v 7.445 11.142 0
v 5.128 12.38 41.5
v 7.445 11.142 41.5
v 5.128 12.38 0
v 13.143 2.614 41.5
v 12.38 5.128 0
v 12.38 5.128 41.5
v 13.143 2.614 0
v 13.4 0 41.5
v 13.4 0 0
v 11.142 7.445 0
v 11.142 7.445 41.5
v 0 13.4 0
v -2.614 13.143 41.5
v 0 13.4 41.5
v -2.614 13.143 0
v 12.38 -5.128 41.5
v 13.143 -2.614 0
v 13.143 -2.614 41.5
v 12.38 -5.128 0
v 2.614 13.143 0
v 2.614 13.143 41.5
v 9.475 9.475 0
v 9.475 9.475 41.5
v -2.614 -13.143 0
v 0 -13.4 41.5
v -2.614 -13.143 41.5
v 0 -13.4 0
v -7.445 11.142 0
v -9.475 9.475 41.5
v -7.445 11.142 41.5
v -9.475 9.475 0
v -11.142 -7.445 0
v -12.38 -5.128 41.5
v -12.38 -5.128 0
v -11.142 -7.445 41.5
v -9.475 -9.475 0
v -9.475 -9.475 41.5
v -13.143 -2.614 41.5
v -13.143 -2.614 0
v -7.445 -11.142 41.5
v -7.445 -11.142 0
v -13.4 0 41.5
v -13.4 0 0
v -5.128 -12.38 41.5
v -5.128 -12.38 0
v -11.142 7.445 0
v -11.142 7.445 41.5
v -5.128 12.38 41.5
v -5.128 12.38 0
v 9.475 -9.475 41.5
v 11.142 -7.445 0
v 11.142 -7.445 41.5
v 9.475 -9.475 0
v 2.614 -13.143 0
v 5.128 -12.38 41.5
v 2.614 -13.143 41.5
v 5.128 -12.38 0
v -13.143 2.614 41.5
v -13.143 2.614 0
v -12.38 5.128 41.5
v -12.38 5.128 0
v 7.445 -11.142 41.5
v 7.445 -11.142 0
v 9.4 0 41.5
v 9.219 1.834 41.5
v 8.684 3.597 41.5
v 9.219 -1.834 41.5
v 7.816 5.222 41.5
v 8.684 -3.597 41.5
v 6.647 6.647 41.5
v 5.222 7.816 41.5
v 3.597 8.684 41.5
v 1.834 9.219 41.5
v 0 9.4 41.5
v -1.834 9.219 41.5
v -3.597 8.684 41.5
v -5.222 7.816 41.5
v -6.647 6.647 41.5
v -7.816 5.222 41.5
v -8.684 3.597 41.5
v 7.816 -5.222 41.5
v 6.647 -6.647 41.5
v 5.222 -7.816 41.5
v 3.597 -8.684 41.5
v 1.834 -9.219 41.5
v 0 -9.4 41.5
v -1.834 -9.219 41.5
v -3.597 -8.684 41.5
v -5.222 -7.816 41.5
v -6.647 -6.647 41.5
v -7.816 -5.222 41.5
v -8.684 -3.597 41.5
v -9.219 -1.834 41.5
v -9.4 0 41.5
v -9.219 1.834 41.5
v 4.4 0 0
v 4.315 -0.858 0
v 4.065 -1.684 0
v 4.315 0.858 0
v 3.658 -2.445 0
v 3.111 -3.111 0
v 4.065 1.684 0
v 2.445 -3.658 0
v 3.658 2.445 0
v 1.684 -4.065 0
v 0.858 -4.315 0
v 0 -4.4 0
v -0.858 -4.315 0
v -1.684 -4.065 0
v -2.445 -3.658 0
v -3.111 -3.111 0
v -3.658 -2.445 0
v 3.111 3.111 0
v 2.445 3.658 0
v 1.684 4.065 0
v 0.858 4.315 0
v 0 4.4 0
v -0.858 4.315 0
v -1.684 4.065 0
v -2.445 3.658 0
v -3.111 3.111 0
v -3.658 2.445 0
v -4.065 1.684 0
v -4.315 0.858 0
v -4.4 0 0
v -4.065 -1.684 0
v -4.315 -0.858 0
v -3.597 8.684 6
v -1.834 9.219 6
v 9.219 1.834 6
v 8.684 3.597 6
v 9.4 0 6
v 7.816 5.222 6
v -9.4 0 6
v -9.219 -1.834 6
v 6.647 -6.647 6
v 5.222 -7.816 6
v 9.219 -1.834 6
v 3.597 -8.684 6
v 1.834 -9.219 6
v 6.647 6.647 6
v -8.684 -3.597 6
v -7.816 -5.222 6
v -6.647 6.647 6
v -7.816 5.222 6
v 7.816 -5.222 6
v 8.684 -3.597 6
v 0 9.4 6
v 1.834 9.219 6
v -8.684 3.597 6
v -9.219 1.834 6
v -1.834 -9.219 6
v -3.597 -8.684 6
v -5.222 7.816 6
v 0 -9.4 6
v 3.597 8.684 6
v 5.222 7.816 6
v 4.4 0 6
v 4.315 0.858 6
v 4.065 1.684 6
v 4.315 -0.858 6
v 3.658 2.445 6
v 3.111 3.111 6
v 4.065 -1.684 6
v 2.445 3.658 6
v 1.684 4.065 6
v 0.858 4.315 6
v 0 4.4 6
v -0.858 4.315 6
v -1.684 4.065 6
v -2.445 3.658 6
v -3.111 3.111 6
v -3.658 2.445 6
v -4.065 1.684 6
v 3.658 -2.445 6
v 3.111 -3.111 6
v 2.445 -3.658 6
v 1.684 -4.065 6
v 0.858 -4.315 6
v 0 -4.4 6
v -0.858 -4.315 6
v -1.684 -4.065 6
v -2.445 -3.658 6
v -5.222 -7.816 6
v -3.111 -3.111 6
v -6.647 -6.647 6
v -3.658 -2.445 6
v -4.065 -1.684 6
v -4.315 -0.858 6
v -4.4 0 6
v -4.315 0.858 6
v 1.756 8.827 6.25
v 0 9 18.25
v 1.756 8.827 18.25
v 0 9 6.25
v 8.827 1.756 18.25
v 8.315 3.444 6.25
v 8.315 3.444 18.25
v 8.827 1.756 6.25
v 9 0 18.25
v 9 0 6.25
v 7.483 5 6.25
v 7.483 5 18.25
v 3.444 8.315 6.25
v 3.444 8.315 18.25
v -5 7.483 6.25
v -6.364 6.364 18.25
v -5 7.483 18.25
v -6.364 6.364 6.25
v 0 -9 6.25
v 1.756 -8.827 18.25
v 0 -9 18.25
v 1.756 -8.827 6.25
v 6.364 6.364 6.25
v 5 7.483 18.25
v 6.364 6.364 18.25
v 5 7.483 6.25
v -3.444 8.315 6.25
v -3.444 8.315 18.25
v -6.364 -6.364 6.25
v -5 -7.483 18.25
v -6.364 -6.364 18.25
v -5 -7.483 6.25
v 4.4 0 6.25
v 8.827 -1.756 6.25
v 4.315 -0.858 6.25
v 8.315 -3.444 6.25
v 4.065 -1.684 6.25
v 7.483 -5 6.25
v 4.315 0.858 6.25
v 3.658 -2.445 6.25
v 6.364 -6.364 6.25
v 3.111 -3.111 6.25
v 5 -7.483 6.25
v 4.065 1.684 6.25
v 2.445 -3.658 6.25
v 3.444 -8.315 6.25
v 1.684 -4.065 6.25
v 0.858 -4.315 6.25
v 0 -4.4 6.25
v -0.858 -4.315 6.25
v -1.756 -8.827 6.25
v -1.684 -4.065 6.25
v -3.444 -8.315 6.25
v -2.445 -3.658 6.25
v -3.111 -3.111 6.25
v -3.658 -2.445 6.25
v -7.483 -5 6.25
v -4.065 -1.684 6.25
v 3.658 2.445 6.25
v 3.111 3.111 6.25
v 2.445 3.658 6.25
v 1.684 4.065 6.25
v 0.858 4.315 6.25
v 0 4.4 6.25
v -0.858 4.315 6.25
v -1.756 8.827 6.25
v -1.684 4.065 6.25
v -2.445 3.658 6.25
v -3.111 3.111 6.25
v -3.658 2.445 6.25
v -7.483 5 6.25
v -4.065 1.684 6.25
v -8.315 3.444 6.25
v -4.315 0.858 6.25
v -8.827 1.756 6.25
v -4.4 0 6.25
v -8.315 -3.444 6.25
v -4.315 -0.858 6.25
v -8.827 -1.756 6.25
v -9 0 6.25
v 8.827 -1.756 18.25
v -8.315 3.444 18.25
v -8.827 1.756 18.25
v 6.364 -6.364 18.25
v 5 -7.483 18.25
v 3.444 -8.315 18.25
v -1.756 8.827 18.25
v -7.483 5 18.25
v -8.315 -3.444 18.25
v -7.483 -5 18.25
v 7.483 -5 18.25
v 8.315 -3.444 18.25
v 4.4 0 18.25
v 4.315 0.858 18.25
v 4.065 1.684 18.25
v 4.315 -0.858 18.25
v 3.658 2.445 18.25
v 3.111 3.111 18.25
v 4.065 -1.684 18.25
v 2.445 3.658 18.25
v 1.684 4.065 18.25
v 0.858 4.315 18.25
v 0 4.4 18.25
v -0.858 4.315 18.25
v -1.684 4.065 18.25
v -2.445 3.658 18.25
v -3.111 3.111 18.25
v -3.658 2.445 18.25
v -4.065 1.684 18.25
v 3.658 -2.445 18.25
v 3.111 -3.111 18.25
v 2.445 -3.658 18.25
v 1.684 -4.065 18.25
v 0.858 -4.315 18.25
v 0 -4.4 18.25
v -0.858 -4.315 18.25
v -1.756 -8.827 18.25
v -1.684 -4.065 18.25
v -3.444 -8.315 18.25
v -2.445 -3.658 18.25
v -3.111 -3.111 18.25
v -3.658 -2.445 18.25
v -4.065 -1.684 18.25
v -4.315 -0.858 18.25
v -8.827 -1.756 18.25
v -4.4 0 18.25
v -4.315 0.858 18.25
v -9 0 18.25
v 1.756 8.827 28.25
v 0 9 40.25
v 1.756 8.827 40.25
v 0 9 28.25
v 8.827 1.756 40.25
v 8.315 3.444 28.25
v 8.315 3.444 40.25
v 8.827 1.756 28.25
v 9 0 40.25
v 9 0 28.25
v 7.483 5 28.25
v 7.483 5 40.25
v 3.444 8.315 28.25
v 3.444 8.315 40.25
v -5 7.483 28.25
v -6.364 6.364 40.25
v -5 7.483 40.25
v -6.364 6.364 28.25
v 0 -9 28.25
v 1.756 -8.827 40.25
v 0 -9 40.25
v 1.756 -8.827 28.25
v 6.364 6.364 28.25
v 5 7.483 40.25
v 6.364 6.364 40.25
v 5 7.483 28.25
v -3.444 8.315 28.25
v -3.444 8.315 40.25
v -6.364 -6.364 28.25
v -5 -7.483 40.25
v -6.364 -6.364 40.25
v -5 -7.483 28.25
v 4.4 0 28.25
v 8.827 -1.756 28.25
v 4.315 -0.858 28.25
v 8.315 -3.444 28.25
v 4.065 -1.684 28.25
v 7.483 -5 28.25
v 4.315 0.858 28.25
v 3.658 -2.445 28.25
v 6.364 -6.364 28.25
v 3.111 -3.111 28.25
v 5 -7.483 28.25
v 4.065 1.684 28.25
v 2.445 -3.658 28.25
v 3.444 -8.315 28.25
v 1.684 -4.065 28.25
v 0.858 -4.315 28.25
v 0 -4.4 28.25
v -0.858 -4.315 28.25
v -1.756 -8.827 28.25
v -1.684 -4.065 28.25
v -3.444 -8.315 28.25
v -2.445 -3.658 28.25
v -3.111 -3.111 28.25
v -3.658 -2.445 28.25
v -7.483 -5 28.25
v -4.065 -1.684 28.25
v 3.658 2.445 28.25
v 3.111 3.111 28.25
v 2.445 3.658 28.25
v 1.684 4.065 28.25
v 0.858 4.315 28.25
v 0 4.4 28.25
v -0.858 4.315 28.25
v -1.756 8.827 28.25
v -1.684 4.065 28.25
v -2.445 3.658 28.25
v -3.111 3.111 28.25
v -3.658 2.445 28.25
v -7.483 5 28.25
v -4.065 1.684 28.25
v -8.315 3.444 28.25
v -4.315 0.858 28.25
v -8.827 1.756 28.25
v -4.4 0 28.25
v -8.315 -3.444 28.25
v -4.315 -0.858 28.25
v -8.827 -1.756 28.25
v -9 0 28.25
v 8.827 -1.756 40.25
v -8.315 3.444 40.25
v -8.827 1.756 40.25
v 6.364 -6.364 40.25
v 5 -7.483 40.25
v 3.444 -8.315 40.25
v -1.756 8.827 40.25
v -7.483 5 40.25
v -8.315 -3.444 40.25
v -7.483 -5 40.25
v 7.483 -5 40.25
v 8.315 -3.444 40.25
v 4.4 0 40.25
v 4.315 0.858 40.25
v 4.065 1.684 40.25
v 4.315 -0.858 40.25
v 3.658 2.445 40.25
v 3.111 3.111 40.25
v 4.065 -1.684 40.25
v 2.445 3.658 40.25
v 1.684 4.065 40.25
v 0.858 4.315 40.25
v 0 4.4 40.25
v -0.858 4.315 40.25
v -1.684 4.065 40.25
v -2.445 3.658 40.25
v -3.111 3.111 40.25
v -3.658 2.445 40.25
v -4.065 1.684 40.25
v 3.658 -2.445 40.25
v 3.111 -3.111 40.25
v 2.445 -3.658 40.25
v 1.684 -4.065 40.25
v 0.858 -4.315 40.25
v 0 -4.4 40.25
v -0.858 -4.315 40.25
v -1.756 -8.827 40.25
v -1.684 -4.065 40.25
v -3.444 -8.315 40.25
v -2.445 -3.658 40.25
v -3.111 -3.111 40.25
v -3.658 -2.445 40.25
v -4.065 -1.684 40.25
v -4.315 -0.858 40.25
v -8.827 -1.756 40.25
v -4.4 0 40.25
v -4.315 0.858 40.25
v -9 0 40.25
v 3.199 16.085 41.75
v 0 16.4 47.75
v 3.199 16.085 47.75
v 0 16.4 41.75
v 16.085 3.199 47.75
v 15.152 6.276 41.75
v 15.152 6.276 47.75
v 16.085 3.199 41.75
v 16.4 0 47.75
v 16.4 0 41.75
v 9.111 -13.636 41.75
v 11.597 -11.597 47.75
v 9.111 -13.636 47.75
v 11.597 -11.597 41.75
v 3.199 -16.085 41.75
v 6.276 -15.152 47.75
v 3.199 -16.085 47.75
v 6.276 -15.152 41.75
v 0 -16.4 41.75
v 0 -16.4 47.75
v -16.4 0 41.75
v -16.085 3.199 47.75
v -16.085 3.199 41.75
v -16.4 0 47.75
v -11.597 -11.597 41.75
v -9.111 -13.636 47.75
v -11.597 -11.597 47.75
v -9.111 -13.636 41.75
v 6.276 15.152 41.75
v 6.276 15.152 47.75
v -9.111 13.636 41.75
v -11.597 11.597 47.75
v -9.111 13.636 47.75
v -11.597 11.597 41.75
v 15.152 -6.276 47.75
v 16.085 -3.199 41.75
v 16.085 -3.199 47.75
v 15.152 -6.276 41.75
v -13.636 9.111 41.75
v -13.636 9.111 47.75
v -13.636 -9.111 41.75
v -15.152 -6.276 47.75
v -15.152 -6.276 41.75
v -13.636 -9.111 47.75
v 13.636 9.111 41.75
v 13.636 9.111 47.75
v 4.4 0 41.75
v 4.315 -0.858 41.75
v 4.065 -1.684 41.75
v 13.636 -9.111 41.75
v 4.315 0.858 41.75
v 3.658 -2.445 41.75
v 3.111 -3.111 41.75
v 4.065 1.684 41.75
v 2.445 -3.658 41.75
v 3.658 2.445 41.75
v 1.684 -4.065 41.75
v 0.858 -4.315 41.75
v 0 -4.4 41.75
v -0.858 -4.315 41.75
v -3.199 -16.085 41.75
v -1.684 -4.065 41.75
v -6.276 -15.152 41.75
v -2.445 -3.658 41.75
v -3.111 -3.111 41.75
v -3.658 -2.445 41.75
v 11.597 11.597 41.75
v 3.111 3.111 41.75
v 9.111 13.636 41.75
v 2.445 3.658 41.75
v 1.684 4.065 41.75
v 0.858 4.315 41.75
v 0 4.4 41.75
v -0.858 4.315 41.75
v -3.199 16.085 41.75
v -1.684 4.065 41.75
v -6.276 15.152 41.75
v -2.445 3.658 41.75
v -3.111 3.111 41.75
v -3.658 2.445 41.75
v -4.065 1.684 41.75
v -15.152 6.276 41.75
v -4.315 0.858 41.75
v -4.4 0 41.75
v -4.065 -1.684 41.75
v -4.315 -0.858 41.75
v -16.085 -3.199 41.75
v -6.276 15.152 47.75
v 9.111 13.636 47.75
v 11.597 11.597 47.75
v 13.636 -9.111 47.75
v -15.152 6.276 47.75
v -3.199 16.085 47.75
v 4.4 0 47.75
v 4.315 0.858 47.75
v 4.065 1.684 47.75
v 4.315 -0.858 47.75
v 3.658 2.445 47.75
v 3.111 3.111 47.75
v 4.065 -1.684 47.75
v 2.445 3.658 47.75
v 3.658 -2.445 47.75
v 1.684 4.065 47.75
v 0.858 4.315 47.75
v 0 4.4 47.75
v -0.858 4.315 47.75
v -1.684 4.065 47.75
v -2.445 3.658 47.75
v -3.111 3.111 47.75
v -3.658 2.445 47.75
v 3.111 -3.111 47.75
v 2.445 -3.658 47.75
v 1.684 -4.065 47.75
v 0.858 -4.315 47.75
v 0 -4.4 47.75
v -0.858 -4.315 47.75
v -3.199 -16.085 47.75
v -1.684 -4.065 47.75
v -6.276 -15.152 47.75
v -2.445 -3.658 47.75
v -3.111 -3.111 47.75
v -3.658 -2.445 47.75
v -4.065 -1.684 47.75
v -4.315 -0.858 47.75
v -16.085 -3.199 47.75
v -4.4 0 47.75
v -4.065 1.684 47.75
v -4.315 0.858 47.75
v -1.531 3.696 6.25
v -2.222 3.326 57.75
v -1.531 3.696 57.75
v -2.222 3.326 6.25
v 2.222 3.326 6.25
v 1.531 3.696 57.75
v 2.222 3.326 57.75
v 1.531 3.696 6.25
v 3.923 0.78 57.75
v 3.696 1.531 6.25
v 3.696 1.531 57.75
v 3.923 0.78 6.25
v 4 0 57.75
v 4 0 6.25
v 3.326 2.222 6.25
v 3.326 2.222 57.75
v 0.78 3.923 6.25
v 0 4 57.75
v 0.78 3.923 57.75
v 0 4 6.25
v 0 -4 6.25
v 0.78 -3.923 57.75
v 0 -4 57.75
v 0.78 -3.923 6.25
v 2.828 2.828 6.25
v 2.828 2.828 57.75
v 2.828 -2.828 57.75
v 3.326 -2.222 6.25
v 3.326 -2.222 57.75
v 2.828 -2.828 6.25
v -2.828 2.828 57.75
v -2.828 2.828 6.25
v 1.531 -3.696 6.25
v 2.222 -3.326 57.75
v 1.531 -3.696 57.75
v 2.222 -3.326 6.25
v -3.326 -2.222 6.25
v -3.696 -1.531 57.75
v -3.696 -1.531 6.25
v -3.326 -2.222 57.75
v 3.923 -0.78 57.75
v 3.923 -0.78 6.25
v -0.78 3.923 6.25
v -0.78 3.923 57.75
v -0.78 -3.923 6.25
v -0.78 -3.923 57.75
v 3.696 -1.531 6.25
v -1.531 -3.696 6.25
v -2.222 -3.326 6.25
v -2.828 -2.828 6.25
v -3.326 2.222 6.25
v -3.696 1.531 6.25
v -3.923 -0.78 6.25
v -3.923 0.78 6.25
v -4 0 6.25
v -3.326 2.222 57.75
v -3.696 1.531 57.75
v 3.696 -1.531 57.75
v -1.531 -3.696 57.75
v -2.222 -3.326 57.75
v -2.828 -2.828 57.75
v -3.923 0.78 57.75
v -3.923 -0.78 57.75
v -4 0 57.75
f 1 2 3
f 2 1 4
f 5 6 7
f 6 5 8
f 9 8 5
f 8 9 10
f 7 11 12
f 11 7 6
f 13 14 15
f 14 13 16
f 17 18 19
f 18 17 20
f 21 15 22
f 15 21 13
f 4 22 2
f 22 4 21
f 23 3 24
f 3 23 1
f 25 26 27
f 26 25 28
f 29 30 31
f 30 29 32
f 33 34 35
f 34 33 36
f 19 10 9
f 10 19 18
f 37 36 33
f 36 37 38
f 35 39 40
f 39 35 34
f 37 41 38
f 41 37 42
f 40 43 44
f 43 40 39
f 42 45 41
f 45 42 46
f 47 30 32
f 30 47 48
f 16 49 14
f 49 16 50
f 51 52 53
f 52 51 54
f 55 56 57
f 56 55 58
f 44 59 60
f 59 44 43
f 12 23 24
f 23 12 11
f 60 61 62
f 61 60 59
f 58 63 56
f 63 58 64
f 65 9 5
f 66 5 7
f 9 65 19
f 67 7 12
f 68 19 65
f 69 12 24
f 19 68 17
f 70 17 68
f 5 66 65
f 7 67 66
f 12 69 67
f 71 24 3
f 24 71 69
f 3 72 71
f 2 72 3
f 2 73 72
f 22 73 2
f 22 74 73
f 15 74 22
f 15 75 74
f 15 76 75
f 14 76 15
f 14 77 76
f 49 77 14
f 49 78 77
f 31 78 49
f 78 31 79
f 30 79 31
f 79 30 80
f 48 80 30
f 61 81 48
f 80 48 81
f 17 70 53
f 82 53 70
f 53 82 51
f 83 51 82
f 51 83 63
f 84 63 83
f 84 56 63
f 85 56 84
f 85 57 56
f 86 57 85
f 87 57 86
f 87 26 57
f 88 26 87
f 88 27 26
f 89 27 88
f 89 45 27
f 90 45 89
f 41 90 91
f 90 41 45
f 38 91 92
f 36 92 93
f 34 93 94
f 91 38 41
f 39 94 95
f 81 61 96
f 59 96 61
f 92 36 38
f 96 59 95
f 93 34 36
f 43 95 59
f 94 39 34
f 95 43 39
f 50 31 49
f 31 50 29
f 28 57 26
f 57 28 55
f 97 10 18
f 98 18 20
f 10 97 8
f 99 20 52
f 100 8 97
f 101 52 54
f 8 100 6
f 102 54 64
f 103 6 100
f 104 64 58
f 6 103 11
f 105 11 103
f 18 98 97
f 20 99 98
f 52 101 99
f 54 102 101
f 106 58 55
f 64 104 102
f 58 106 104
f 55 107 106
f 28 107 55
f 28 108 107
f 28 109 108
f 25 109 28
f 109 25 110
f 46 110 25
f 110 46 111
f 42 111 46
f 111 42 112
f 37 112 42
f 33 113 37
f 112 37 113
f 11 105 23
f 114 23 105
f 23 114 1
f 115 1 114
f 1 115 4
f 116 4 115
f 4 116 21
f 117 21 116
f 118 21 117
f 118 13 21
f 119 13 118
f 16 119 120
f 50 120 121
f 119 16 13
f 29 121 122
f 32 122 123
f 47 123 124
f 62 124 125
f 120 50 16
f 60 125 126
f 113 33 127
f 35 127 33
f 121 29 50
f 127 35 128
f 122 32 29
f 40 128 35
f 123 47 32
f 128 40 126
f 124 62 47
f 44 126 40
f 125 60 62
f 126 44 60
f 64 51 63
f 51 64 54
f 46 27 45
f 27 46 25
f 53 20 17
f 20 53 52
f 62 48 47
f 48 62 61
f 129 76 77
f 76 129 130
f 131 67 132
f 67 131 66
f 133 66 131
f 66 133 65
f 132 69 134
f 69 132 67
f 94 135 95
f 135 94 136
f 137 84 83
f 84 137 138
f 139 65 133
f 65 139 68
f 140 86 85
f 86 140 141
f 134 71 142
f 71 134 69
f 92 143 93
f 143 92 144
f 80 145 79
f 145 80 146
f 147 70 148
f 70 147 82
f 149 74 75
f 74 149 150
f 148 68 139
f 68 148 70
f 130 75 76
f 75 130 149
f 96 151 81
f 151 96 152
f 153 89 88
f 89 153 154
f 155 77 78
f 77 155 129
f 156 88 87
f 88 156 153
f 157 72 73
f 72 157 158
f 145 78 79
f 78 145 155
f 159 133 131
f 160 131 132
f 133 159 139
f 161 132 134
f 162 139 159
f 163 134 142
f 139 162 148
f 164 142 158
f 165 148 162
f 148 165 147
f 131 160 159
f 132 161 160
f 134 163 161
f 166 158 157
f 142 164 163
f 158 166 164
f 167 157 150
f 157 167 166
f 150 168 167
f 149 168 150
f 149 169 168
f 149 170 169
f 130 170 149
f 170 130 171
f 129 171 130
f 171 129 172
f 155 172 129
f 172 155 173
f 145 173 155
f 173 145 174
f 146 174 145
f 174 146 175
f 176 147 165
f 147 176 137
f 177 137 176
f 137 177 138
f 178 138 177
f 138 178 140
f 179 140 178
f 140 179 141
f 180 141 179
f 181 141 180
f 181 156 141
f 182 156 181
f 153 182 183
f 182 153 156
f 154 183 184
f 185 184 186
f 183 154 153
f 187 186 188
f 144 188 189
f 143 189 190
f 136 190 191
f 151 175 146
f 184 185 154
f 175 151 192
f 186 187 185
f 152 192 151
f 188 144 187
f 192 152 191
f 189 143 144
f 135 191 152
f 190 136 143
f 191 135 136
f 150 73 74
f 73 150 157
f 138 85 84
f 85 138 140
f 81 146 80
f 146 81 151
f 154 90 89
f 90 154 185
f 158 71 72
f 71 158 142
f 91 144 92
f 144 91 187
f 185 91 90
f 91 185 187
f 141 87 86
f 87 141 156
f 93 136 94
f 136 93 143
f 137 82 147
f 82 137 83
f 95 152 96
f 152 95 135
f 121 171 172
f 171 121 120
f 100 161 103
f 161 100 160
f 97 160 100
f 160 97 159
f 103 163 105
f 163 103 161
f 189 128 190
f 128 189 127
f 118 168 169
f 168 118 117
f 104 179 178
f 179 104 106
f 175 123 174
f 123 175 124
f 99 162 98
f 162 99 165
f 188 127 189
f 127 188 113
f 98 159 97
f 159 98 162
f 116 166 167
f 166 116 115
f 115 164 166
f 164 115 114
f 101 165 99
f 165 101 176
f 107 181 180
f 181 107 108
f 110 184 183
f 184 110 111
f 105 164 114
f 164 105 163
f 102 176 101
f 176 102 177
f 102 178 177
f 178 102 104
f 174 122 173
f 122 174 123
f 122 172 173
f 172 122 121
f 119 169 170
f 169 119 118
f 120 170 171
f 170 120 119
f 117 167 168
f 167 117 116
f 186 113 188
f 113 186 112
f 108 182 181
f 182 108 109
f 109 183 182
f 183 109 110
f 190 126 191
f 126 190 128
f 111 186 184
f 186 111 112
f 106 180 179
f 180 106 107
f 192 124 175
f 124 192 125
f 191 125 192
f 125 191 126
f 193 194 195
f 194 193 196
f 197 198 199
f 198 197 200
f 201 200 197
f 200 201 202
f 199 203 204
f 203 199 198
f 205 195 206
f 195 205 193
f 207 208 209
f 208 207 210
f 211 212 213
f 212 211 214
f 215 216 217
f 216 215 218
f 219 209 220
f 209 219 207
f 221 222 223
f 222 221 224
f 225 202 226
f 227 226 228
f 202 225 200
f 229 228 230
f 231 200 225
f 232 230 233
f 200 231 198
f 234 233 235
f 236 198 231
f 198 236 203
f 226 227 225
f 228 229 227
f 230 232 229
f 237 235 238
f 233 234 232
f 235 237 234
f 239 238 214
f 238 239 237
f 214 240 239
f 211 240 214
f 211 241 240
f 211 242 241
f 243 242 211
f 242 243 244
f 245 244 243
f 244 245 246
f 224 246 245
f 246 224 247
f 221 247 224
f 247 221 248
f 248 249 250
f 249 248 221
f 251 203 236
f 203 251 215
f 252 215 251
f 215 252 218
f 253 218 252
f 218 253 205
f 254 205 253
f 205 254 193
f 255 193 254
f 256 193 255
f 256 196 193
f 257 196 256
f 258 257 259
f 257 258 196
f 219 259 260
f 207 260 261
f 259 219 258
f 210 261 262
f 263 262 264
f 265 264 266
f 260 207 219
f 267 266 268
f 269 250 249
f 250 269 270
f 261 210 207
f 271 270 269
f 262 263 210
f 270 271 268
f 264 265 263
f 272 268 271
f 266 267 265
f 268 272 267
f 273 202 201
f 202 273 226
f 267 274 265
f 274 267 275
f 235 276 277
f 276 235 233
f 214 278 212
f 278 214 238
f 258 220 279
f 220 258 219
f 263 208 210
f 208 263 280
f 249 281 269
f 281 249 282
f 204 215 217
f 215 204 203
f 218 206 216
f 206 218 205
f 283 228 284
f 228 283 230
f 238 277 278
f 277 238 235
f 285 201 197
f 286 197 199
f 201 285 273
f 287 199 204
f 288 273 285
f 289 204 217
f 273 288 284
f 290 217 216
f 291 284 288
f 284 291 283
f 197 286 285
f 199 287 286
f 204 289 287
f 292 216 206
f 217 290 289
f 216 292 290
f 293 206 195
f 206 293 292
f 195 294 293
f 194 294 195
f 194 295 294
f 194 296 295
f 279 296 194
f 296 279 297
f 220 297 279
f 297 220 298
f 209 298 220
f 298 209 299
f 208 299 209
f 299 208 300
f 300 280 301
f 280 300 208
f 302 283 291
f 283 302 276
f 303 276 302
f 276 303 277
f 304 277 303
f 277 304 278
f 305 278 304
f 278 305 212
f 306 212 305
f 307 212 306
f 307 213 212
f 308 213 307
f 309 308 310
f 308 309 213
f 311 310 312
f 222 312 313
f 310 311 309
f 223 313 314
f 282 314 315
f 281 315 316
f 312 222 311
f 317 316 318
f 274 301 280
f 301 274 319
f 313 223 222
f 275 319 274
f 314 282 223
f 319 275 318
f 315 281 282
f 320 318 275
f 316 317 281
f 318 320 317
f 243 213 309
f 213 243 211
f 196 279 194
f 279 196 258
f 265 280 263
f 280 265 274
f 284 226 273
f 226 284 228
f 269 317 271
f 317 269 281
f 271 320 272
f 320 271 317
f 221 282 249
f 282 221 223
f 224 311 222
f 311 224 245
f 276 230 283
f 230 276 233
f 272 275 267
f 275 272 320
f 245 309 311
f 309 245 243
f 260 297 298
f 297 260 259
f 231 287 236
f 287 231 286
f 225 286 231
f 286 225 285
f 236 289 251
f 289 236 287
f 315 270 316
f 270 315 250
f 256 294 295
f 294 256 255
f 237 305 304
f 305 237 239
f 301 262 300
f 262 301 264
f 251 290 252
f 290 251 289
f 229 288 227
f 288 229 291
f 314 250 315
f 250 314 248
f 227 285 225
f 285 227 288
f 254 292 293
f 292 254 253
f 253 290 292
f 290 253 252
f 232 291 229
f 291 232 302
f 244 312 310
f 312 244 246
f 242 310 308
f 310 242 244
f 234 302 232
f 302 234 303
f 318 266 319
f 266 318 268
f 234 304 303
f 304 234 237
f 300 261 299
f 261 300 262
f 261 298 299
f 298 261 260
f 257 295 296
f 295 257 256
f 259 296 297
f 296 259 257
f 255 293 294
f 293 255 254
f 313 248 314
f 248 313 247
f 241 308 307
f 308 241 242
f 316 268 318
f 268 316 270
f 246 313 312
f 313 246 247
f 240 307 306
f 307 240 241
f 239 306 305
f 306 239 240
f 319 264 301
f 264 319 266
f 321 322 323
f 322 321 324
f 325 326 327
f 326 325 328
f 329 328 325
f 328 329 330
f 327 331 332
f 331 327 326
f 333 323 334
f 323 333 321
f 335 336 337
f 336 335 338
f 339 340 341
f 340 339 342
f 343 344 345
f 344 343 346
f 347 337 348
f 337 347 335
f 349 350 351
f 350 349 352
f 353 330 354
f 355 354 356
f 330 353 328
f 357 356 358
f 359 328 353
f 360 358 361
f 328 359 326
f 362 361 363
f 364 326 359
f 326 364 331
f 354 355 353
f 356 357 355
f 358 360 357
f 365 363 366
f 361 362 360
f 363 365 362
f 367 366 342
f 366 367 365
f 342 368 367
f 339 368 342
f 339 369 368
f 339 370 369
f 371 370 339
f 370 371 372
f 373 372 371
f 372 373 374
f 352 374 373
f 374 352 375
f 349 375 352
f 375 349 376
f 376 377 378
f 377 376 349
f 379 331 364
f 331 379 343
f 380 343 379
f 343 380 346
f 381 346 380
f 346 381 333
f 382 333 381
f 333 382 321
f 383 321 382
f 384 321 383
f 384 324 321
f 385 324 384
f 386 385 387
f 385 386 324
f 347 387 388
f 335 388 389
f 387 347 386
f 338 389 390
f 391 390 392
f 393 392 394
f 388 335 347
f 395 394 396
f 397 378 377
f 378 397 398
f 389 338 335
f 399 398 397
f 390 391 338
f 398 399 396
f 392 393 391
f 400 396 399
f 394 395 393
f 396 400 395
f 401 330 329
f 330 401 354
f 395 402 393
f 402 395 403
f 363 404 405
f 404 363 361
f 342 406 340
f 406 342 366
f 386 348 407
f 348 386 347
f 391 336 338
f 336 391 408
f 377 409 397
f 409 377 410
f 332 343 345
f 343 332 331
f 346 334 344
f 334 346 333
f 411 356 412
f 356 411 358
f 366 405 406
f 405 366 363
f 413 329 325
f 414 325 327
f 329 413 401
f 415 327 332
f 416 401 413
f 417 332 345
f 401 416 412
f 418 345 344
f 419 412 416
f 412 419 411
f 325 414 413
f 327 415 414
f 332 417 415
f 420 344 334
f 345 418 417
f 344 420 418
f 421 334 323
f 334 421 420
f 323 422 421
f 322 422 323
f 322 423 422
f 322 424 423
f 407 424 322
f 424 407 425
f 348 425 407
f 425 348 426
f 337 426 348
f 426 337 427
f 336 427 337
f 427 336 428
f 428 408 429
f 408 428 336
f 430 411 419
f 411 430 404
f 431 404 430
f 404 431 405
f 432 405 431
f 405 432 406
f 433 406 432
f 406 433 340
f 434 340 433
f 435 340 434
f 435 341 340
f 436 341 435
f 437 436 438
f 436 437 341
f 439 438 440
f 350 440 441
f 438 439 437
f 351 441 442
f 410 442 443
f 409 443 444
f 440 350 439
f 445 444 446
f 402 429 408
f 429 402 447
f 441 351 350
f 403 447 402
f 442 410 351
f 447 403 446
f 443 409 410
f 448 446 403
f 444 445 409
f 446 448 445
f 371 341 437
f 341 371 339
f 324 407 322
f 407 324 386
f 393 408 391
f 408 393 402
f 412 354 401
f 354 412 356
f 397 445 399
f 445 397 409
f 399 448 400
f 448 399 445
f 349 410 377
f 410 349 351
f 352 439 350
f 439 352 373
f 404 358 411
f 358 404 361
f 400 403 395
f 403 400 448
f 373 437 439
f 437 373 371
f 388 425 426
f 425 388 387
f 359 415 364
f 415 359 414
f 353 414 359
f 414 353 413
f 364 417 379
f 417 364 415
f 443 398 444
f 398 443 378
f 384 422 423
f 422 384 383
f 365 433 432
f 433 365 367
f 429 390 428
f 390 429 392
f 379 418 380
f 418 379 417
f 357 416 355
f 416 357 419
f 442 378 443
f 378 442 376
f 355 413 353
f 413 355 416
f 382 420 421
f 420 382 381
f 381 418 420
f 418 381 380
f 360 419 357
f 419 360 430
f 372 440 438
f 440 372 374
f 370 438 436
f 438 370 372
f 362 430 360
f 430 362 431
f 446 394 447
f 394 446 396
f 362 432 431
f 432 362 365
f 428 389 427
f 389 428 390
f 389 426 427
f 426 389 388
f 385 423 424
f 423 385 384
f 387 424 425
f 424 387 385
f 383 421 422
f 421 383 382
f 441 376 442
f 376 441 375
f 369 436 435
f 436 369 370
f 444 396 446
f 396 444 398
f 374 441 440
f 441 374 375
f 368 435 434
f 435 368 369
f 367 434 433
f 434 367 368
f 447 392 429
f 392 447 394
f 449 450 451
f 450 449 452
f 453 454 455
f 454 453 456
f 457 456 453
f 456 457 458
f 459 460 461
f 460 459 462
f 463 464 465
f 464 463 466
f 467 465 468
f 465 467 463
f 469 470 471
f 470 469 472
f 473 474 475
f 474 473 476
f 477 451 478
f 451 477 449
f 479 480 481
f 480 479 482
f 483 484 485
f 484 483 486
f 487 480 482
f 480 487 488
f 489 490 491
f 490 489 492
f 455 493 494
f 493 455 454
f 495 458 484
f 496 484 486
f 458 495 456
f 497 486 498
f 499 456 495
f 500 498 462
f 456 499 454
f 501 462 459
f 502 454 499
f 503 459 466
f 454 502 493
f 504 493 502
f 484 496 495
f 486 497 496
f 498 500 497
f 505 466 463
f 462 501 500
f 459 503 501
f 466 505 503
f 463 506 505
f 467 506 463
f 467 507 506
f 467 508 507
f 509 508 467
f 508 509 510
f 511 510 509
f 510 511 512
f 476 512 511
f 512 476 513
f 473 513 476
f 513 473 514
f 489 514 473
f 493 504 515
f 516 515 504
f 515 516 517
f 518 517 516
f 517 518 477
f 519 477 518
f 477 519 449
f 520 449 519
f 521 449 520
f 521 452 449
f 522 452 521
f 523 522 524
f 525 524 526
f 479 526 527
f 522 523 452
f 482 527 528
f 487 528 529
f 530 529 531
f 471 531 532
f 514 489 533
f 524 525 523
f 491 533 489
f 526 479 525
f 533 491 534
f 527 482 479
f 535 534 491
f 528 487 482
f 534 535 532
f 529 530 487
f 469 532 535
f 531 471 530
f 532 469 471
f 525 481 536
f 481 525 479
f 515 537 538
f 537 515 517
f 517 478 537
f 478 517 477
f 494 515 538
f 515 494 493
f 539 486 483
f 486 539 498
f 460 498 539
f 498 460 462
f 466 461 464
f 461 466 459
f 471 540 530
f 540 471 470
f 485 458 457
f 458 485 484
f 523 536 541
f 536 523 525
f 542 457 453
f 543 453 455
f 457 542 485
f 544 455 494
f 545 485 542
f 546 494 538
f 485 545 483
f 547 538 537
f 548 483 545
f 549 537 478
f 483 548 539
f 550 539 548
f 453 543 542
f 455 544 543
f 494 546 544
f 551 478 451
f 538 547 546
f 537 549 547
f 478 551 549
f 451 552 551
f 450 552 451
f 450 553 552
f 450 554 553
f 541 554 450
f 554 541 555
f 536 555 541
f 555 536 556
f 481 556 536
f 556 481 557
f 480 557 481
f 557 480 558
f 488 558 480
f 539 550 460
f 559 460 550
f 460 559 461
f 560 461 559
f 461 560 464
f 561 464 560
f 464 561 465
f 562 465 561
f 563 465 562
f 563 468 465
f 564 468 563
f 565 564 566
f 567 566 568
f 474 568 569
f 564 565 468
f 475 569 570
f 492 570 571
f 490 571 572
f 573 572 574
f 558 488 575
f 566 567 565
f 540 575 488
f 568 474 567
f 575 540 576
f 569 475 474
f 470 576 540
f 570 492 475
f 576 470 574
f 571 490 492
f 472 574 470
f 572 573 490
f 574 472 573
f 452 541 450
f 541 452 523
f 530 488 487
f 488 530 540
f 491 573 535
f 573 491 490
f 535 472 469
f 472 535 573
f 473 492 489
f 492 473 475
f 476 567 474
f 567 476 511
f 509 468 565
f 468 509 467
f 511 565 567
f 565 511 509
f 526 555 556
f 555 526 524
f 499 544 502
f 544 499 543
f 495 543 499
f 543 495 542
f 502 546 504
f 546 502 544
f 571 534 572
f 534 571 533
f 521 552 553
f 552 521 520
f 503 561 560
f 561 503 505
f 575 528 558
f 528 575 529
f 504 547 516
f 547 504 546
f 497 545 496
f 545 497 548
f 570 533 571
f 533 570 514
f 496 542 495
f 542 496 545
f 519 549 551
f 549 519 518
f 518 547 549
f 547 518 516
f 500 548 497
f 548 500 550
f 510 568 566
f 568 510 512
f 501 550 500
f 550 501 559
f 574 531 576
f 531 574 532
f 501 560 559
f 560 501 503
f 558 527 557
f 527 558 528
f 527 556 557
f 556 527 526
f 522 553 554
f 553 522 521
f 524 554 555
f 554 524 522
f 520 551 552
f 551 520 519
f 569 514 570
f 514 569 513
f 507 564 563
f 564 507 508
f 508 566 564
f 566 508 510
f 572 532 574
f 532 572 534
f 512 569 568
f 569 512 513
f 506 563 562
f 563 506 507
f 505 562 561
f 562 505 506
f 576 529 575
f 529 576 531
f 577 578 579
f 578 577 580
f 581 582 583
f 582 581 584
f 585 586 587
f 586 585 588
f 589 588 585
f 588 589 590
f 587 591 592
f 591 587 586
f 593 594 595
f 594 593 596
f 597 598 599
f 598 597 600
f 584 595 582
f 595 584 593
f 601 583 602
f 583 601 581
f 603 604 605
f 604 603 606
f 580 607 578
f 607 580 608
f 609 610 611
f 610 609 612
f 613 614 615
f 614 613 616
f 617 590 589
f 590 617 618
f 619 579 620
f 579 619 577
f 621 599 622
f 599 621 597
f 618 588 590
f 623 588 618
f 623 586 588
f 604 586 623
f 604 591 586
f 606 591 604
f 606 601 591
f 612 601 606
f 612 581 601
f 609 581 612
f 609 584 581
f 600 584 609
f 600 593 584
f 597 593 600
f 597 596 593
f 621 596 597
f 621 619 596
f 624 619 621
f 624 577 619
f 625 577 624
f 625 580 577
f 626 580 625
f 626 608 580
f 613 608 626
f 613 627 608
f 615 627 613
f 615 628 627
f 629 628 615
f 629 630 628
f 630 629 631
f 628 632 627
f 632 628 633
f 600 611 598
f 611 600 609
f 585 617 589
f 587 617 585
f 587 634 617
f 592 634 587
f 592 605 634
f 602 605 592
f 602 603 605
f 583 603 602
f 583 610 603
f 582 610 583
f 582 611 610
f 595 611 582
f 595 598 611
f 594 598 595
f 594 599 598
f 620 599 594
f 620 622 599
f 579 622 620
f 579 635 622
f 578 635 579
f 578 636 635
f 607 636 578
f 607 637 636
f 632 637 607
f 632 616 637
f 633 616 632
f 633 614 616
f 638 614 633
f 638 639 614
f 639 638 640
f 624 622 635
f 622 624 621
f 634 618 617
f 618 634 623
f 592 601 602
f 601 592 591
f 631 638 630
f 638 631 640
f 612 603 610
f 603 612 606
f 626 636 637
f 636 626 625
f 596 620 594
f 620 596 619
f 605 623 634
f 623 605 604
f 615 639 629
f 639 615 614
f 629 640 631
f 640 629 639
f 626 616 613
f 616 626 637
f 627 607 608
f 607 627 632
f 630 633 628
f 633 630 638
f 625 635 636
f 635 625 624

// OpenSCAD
$fn = 32;

// ------------------------------------------------------------------------
// Shaft station: cup d26.8 x 41.5 mm, shaft d8
// Every part is its own module, assembly() places every instance.
// ------------------------------------------------------------------------

// --- part 1 ---
module housing_cup() {
  difference() {
    cylinder(h = 41.5, d = 26.8);
    translate([0, 0, 6]) cylinder(h = 36.5, d = 18.8);
    translate([0, 0, -1]) cylinder(h = 8, d = 8.8);
  }
}

// --- part 2 ---
module bearing_lower() {
  difference() {
      translate([0, 0, 0]) cylinder(h = 12, d = 18);
      translate([0, 0, -1]) cylinder(h = 14, d = 8.8);
    }
}

// --- part 3 ---
module bearing_upper() {
  difference() {
      translate([0, 0, 0]) cylinder(h = 12, d = 18);
      translate([0, 0, -1]) cylinder(h = 14, d = 8.8);
    }
}

// --- part 4 ---
module station_shaft() {
  translate([0, 0, -25.75]) cylinder(h = 51.5, d = 8);
}

// --- part 5 ---
module station_cover() {
  difference() {
    cylinder(h = 6, d = 32.8);
    translate([0, 0, -1]) cylinder(h = 8, d = 8.8);
  }
}

// --- assembly ---
module assembly() {
  color([0.80, 0.24, 0.20]) translate([0, 0, 0]) rotate([0, 0, 0]) housing_cup();
  color([0.20, 0.45, 0.75]) translate([0, 0, 6.25]) rotate([0, 0, 0]) bearing_lower();
  color([0.25, 0.62, 0.32]) translate([0, 0, 28.25]) rotate([0, 0, 0]) bearing_upper();
  color([0.92, 0.70, 0.18]) translate([0, 0, 32]) rotate([0, 0, 0]) station_shaft();
  color([0.58, 0.35, 0.70]) translate([0, 0, 41.75]) rotate([0, 0, 0]) station_cover();
}

assembly();
